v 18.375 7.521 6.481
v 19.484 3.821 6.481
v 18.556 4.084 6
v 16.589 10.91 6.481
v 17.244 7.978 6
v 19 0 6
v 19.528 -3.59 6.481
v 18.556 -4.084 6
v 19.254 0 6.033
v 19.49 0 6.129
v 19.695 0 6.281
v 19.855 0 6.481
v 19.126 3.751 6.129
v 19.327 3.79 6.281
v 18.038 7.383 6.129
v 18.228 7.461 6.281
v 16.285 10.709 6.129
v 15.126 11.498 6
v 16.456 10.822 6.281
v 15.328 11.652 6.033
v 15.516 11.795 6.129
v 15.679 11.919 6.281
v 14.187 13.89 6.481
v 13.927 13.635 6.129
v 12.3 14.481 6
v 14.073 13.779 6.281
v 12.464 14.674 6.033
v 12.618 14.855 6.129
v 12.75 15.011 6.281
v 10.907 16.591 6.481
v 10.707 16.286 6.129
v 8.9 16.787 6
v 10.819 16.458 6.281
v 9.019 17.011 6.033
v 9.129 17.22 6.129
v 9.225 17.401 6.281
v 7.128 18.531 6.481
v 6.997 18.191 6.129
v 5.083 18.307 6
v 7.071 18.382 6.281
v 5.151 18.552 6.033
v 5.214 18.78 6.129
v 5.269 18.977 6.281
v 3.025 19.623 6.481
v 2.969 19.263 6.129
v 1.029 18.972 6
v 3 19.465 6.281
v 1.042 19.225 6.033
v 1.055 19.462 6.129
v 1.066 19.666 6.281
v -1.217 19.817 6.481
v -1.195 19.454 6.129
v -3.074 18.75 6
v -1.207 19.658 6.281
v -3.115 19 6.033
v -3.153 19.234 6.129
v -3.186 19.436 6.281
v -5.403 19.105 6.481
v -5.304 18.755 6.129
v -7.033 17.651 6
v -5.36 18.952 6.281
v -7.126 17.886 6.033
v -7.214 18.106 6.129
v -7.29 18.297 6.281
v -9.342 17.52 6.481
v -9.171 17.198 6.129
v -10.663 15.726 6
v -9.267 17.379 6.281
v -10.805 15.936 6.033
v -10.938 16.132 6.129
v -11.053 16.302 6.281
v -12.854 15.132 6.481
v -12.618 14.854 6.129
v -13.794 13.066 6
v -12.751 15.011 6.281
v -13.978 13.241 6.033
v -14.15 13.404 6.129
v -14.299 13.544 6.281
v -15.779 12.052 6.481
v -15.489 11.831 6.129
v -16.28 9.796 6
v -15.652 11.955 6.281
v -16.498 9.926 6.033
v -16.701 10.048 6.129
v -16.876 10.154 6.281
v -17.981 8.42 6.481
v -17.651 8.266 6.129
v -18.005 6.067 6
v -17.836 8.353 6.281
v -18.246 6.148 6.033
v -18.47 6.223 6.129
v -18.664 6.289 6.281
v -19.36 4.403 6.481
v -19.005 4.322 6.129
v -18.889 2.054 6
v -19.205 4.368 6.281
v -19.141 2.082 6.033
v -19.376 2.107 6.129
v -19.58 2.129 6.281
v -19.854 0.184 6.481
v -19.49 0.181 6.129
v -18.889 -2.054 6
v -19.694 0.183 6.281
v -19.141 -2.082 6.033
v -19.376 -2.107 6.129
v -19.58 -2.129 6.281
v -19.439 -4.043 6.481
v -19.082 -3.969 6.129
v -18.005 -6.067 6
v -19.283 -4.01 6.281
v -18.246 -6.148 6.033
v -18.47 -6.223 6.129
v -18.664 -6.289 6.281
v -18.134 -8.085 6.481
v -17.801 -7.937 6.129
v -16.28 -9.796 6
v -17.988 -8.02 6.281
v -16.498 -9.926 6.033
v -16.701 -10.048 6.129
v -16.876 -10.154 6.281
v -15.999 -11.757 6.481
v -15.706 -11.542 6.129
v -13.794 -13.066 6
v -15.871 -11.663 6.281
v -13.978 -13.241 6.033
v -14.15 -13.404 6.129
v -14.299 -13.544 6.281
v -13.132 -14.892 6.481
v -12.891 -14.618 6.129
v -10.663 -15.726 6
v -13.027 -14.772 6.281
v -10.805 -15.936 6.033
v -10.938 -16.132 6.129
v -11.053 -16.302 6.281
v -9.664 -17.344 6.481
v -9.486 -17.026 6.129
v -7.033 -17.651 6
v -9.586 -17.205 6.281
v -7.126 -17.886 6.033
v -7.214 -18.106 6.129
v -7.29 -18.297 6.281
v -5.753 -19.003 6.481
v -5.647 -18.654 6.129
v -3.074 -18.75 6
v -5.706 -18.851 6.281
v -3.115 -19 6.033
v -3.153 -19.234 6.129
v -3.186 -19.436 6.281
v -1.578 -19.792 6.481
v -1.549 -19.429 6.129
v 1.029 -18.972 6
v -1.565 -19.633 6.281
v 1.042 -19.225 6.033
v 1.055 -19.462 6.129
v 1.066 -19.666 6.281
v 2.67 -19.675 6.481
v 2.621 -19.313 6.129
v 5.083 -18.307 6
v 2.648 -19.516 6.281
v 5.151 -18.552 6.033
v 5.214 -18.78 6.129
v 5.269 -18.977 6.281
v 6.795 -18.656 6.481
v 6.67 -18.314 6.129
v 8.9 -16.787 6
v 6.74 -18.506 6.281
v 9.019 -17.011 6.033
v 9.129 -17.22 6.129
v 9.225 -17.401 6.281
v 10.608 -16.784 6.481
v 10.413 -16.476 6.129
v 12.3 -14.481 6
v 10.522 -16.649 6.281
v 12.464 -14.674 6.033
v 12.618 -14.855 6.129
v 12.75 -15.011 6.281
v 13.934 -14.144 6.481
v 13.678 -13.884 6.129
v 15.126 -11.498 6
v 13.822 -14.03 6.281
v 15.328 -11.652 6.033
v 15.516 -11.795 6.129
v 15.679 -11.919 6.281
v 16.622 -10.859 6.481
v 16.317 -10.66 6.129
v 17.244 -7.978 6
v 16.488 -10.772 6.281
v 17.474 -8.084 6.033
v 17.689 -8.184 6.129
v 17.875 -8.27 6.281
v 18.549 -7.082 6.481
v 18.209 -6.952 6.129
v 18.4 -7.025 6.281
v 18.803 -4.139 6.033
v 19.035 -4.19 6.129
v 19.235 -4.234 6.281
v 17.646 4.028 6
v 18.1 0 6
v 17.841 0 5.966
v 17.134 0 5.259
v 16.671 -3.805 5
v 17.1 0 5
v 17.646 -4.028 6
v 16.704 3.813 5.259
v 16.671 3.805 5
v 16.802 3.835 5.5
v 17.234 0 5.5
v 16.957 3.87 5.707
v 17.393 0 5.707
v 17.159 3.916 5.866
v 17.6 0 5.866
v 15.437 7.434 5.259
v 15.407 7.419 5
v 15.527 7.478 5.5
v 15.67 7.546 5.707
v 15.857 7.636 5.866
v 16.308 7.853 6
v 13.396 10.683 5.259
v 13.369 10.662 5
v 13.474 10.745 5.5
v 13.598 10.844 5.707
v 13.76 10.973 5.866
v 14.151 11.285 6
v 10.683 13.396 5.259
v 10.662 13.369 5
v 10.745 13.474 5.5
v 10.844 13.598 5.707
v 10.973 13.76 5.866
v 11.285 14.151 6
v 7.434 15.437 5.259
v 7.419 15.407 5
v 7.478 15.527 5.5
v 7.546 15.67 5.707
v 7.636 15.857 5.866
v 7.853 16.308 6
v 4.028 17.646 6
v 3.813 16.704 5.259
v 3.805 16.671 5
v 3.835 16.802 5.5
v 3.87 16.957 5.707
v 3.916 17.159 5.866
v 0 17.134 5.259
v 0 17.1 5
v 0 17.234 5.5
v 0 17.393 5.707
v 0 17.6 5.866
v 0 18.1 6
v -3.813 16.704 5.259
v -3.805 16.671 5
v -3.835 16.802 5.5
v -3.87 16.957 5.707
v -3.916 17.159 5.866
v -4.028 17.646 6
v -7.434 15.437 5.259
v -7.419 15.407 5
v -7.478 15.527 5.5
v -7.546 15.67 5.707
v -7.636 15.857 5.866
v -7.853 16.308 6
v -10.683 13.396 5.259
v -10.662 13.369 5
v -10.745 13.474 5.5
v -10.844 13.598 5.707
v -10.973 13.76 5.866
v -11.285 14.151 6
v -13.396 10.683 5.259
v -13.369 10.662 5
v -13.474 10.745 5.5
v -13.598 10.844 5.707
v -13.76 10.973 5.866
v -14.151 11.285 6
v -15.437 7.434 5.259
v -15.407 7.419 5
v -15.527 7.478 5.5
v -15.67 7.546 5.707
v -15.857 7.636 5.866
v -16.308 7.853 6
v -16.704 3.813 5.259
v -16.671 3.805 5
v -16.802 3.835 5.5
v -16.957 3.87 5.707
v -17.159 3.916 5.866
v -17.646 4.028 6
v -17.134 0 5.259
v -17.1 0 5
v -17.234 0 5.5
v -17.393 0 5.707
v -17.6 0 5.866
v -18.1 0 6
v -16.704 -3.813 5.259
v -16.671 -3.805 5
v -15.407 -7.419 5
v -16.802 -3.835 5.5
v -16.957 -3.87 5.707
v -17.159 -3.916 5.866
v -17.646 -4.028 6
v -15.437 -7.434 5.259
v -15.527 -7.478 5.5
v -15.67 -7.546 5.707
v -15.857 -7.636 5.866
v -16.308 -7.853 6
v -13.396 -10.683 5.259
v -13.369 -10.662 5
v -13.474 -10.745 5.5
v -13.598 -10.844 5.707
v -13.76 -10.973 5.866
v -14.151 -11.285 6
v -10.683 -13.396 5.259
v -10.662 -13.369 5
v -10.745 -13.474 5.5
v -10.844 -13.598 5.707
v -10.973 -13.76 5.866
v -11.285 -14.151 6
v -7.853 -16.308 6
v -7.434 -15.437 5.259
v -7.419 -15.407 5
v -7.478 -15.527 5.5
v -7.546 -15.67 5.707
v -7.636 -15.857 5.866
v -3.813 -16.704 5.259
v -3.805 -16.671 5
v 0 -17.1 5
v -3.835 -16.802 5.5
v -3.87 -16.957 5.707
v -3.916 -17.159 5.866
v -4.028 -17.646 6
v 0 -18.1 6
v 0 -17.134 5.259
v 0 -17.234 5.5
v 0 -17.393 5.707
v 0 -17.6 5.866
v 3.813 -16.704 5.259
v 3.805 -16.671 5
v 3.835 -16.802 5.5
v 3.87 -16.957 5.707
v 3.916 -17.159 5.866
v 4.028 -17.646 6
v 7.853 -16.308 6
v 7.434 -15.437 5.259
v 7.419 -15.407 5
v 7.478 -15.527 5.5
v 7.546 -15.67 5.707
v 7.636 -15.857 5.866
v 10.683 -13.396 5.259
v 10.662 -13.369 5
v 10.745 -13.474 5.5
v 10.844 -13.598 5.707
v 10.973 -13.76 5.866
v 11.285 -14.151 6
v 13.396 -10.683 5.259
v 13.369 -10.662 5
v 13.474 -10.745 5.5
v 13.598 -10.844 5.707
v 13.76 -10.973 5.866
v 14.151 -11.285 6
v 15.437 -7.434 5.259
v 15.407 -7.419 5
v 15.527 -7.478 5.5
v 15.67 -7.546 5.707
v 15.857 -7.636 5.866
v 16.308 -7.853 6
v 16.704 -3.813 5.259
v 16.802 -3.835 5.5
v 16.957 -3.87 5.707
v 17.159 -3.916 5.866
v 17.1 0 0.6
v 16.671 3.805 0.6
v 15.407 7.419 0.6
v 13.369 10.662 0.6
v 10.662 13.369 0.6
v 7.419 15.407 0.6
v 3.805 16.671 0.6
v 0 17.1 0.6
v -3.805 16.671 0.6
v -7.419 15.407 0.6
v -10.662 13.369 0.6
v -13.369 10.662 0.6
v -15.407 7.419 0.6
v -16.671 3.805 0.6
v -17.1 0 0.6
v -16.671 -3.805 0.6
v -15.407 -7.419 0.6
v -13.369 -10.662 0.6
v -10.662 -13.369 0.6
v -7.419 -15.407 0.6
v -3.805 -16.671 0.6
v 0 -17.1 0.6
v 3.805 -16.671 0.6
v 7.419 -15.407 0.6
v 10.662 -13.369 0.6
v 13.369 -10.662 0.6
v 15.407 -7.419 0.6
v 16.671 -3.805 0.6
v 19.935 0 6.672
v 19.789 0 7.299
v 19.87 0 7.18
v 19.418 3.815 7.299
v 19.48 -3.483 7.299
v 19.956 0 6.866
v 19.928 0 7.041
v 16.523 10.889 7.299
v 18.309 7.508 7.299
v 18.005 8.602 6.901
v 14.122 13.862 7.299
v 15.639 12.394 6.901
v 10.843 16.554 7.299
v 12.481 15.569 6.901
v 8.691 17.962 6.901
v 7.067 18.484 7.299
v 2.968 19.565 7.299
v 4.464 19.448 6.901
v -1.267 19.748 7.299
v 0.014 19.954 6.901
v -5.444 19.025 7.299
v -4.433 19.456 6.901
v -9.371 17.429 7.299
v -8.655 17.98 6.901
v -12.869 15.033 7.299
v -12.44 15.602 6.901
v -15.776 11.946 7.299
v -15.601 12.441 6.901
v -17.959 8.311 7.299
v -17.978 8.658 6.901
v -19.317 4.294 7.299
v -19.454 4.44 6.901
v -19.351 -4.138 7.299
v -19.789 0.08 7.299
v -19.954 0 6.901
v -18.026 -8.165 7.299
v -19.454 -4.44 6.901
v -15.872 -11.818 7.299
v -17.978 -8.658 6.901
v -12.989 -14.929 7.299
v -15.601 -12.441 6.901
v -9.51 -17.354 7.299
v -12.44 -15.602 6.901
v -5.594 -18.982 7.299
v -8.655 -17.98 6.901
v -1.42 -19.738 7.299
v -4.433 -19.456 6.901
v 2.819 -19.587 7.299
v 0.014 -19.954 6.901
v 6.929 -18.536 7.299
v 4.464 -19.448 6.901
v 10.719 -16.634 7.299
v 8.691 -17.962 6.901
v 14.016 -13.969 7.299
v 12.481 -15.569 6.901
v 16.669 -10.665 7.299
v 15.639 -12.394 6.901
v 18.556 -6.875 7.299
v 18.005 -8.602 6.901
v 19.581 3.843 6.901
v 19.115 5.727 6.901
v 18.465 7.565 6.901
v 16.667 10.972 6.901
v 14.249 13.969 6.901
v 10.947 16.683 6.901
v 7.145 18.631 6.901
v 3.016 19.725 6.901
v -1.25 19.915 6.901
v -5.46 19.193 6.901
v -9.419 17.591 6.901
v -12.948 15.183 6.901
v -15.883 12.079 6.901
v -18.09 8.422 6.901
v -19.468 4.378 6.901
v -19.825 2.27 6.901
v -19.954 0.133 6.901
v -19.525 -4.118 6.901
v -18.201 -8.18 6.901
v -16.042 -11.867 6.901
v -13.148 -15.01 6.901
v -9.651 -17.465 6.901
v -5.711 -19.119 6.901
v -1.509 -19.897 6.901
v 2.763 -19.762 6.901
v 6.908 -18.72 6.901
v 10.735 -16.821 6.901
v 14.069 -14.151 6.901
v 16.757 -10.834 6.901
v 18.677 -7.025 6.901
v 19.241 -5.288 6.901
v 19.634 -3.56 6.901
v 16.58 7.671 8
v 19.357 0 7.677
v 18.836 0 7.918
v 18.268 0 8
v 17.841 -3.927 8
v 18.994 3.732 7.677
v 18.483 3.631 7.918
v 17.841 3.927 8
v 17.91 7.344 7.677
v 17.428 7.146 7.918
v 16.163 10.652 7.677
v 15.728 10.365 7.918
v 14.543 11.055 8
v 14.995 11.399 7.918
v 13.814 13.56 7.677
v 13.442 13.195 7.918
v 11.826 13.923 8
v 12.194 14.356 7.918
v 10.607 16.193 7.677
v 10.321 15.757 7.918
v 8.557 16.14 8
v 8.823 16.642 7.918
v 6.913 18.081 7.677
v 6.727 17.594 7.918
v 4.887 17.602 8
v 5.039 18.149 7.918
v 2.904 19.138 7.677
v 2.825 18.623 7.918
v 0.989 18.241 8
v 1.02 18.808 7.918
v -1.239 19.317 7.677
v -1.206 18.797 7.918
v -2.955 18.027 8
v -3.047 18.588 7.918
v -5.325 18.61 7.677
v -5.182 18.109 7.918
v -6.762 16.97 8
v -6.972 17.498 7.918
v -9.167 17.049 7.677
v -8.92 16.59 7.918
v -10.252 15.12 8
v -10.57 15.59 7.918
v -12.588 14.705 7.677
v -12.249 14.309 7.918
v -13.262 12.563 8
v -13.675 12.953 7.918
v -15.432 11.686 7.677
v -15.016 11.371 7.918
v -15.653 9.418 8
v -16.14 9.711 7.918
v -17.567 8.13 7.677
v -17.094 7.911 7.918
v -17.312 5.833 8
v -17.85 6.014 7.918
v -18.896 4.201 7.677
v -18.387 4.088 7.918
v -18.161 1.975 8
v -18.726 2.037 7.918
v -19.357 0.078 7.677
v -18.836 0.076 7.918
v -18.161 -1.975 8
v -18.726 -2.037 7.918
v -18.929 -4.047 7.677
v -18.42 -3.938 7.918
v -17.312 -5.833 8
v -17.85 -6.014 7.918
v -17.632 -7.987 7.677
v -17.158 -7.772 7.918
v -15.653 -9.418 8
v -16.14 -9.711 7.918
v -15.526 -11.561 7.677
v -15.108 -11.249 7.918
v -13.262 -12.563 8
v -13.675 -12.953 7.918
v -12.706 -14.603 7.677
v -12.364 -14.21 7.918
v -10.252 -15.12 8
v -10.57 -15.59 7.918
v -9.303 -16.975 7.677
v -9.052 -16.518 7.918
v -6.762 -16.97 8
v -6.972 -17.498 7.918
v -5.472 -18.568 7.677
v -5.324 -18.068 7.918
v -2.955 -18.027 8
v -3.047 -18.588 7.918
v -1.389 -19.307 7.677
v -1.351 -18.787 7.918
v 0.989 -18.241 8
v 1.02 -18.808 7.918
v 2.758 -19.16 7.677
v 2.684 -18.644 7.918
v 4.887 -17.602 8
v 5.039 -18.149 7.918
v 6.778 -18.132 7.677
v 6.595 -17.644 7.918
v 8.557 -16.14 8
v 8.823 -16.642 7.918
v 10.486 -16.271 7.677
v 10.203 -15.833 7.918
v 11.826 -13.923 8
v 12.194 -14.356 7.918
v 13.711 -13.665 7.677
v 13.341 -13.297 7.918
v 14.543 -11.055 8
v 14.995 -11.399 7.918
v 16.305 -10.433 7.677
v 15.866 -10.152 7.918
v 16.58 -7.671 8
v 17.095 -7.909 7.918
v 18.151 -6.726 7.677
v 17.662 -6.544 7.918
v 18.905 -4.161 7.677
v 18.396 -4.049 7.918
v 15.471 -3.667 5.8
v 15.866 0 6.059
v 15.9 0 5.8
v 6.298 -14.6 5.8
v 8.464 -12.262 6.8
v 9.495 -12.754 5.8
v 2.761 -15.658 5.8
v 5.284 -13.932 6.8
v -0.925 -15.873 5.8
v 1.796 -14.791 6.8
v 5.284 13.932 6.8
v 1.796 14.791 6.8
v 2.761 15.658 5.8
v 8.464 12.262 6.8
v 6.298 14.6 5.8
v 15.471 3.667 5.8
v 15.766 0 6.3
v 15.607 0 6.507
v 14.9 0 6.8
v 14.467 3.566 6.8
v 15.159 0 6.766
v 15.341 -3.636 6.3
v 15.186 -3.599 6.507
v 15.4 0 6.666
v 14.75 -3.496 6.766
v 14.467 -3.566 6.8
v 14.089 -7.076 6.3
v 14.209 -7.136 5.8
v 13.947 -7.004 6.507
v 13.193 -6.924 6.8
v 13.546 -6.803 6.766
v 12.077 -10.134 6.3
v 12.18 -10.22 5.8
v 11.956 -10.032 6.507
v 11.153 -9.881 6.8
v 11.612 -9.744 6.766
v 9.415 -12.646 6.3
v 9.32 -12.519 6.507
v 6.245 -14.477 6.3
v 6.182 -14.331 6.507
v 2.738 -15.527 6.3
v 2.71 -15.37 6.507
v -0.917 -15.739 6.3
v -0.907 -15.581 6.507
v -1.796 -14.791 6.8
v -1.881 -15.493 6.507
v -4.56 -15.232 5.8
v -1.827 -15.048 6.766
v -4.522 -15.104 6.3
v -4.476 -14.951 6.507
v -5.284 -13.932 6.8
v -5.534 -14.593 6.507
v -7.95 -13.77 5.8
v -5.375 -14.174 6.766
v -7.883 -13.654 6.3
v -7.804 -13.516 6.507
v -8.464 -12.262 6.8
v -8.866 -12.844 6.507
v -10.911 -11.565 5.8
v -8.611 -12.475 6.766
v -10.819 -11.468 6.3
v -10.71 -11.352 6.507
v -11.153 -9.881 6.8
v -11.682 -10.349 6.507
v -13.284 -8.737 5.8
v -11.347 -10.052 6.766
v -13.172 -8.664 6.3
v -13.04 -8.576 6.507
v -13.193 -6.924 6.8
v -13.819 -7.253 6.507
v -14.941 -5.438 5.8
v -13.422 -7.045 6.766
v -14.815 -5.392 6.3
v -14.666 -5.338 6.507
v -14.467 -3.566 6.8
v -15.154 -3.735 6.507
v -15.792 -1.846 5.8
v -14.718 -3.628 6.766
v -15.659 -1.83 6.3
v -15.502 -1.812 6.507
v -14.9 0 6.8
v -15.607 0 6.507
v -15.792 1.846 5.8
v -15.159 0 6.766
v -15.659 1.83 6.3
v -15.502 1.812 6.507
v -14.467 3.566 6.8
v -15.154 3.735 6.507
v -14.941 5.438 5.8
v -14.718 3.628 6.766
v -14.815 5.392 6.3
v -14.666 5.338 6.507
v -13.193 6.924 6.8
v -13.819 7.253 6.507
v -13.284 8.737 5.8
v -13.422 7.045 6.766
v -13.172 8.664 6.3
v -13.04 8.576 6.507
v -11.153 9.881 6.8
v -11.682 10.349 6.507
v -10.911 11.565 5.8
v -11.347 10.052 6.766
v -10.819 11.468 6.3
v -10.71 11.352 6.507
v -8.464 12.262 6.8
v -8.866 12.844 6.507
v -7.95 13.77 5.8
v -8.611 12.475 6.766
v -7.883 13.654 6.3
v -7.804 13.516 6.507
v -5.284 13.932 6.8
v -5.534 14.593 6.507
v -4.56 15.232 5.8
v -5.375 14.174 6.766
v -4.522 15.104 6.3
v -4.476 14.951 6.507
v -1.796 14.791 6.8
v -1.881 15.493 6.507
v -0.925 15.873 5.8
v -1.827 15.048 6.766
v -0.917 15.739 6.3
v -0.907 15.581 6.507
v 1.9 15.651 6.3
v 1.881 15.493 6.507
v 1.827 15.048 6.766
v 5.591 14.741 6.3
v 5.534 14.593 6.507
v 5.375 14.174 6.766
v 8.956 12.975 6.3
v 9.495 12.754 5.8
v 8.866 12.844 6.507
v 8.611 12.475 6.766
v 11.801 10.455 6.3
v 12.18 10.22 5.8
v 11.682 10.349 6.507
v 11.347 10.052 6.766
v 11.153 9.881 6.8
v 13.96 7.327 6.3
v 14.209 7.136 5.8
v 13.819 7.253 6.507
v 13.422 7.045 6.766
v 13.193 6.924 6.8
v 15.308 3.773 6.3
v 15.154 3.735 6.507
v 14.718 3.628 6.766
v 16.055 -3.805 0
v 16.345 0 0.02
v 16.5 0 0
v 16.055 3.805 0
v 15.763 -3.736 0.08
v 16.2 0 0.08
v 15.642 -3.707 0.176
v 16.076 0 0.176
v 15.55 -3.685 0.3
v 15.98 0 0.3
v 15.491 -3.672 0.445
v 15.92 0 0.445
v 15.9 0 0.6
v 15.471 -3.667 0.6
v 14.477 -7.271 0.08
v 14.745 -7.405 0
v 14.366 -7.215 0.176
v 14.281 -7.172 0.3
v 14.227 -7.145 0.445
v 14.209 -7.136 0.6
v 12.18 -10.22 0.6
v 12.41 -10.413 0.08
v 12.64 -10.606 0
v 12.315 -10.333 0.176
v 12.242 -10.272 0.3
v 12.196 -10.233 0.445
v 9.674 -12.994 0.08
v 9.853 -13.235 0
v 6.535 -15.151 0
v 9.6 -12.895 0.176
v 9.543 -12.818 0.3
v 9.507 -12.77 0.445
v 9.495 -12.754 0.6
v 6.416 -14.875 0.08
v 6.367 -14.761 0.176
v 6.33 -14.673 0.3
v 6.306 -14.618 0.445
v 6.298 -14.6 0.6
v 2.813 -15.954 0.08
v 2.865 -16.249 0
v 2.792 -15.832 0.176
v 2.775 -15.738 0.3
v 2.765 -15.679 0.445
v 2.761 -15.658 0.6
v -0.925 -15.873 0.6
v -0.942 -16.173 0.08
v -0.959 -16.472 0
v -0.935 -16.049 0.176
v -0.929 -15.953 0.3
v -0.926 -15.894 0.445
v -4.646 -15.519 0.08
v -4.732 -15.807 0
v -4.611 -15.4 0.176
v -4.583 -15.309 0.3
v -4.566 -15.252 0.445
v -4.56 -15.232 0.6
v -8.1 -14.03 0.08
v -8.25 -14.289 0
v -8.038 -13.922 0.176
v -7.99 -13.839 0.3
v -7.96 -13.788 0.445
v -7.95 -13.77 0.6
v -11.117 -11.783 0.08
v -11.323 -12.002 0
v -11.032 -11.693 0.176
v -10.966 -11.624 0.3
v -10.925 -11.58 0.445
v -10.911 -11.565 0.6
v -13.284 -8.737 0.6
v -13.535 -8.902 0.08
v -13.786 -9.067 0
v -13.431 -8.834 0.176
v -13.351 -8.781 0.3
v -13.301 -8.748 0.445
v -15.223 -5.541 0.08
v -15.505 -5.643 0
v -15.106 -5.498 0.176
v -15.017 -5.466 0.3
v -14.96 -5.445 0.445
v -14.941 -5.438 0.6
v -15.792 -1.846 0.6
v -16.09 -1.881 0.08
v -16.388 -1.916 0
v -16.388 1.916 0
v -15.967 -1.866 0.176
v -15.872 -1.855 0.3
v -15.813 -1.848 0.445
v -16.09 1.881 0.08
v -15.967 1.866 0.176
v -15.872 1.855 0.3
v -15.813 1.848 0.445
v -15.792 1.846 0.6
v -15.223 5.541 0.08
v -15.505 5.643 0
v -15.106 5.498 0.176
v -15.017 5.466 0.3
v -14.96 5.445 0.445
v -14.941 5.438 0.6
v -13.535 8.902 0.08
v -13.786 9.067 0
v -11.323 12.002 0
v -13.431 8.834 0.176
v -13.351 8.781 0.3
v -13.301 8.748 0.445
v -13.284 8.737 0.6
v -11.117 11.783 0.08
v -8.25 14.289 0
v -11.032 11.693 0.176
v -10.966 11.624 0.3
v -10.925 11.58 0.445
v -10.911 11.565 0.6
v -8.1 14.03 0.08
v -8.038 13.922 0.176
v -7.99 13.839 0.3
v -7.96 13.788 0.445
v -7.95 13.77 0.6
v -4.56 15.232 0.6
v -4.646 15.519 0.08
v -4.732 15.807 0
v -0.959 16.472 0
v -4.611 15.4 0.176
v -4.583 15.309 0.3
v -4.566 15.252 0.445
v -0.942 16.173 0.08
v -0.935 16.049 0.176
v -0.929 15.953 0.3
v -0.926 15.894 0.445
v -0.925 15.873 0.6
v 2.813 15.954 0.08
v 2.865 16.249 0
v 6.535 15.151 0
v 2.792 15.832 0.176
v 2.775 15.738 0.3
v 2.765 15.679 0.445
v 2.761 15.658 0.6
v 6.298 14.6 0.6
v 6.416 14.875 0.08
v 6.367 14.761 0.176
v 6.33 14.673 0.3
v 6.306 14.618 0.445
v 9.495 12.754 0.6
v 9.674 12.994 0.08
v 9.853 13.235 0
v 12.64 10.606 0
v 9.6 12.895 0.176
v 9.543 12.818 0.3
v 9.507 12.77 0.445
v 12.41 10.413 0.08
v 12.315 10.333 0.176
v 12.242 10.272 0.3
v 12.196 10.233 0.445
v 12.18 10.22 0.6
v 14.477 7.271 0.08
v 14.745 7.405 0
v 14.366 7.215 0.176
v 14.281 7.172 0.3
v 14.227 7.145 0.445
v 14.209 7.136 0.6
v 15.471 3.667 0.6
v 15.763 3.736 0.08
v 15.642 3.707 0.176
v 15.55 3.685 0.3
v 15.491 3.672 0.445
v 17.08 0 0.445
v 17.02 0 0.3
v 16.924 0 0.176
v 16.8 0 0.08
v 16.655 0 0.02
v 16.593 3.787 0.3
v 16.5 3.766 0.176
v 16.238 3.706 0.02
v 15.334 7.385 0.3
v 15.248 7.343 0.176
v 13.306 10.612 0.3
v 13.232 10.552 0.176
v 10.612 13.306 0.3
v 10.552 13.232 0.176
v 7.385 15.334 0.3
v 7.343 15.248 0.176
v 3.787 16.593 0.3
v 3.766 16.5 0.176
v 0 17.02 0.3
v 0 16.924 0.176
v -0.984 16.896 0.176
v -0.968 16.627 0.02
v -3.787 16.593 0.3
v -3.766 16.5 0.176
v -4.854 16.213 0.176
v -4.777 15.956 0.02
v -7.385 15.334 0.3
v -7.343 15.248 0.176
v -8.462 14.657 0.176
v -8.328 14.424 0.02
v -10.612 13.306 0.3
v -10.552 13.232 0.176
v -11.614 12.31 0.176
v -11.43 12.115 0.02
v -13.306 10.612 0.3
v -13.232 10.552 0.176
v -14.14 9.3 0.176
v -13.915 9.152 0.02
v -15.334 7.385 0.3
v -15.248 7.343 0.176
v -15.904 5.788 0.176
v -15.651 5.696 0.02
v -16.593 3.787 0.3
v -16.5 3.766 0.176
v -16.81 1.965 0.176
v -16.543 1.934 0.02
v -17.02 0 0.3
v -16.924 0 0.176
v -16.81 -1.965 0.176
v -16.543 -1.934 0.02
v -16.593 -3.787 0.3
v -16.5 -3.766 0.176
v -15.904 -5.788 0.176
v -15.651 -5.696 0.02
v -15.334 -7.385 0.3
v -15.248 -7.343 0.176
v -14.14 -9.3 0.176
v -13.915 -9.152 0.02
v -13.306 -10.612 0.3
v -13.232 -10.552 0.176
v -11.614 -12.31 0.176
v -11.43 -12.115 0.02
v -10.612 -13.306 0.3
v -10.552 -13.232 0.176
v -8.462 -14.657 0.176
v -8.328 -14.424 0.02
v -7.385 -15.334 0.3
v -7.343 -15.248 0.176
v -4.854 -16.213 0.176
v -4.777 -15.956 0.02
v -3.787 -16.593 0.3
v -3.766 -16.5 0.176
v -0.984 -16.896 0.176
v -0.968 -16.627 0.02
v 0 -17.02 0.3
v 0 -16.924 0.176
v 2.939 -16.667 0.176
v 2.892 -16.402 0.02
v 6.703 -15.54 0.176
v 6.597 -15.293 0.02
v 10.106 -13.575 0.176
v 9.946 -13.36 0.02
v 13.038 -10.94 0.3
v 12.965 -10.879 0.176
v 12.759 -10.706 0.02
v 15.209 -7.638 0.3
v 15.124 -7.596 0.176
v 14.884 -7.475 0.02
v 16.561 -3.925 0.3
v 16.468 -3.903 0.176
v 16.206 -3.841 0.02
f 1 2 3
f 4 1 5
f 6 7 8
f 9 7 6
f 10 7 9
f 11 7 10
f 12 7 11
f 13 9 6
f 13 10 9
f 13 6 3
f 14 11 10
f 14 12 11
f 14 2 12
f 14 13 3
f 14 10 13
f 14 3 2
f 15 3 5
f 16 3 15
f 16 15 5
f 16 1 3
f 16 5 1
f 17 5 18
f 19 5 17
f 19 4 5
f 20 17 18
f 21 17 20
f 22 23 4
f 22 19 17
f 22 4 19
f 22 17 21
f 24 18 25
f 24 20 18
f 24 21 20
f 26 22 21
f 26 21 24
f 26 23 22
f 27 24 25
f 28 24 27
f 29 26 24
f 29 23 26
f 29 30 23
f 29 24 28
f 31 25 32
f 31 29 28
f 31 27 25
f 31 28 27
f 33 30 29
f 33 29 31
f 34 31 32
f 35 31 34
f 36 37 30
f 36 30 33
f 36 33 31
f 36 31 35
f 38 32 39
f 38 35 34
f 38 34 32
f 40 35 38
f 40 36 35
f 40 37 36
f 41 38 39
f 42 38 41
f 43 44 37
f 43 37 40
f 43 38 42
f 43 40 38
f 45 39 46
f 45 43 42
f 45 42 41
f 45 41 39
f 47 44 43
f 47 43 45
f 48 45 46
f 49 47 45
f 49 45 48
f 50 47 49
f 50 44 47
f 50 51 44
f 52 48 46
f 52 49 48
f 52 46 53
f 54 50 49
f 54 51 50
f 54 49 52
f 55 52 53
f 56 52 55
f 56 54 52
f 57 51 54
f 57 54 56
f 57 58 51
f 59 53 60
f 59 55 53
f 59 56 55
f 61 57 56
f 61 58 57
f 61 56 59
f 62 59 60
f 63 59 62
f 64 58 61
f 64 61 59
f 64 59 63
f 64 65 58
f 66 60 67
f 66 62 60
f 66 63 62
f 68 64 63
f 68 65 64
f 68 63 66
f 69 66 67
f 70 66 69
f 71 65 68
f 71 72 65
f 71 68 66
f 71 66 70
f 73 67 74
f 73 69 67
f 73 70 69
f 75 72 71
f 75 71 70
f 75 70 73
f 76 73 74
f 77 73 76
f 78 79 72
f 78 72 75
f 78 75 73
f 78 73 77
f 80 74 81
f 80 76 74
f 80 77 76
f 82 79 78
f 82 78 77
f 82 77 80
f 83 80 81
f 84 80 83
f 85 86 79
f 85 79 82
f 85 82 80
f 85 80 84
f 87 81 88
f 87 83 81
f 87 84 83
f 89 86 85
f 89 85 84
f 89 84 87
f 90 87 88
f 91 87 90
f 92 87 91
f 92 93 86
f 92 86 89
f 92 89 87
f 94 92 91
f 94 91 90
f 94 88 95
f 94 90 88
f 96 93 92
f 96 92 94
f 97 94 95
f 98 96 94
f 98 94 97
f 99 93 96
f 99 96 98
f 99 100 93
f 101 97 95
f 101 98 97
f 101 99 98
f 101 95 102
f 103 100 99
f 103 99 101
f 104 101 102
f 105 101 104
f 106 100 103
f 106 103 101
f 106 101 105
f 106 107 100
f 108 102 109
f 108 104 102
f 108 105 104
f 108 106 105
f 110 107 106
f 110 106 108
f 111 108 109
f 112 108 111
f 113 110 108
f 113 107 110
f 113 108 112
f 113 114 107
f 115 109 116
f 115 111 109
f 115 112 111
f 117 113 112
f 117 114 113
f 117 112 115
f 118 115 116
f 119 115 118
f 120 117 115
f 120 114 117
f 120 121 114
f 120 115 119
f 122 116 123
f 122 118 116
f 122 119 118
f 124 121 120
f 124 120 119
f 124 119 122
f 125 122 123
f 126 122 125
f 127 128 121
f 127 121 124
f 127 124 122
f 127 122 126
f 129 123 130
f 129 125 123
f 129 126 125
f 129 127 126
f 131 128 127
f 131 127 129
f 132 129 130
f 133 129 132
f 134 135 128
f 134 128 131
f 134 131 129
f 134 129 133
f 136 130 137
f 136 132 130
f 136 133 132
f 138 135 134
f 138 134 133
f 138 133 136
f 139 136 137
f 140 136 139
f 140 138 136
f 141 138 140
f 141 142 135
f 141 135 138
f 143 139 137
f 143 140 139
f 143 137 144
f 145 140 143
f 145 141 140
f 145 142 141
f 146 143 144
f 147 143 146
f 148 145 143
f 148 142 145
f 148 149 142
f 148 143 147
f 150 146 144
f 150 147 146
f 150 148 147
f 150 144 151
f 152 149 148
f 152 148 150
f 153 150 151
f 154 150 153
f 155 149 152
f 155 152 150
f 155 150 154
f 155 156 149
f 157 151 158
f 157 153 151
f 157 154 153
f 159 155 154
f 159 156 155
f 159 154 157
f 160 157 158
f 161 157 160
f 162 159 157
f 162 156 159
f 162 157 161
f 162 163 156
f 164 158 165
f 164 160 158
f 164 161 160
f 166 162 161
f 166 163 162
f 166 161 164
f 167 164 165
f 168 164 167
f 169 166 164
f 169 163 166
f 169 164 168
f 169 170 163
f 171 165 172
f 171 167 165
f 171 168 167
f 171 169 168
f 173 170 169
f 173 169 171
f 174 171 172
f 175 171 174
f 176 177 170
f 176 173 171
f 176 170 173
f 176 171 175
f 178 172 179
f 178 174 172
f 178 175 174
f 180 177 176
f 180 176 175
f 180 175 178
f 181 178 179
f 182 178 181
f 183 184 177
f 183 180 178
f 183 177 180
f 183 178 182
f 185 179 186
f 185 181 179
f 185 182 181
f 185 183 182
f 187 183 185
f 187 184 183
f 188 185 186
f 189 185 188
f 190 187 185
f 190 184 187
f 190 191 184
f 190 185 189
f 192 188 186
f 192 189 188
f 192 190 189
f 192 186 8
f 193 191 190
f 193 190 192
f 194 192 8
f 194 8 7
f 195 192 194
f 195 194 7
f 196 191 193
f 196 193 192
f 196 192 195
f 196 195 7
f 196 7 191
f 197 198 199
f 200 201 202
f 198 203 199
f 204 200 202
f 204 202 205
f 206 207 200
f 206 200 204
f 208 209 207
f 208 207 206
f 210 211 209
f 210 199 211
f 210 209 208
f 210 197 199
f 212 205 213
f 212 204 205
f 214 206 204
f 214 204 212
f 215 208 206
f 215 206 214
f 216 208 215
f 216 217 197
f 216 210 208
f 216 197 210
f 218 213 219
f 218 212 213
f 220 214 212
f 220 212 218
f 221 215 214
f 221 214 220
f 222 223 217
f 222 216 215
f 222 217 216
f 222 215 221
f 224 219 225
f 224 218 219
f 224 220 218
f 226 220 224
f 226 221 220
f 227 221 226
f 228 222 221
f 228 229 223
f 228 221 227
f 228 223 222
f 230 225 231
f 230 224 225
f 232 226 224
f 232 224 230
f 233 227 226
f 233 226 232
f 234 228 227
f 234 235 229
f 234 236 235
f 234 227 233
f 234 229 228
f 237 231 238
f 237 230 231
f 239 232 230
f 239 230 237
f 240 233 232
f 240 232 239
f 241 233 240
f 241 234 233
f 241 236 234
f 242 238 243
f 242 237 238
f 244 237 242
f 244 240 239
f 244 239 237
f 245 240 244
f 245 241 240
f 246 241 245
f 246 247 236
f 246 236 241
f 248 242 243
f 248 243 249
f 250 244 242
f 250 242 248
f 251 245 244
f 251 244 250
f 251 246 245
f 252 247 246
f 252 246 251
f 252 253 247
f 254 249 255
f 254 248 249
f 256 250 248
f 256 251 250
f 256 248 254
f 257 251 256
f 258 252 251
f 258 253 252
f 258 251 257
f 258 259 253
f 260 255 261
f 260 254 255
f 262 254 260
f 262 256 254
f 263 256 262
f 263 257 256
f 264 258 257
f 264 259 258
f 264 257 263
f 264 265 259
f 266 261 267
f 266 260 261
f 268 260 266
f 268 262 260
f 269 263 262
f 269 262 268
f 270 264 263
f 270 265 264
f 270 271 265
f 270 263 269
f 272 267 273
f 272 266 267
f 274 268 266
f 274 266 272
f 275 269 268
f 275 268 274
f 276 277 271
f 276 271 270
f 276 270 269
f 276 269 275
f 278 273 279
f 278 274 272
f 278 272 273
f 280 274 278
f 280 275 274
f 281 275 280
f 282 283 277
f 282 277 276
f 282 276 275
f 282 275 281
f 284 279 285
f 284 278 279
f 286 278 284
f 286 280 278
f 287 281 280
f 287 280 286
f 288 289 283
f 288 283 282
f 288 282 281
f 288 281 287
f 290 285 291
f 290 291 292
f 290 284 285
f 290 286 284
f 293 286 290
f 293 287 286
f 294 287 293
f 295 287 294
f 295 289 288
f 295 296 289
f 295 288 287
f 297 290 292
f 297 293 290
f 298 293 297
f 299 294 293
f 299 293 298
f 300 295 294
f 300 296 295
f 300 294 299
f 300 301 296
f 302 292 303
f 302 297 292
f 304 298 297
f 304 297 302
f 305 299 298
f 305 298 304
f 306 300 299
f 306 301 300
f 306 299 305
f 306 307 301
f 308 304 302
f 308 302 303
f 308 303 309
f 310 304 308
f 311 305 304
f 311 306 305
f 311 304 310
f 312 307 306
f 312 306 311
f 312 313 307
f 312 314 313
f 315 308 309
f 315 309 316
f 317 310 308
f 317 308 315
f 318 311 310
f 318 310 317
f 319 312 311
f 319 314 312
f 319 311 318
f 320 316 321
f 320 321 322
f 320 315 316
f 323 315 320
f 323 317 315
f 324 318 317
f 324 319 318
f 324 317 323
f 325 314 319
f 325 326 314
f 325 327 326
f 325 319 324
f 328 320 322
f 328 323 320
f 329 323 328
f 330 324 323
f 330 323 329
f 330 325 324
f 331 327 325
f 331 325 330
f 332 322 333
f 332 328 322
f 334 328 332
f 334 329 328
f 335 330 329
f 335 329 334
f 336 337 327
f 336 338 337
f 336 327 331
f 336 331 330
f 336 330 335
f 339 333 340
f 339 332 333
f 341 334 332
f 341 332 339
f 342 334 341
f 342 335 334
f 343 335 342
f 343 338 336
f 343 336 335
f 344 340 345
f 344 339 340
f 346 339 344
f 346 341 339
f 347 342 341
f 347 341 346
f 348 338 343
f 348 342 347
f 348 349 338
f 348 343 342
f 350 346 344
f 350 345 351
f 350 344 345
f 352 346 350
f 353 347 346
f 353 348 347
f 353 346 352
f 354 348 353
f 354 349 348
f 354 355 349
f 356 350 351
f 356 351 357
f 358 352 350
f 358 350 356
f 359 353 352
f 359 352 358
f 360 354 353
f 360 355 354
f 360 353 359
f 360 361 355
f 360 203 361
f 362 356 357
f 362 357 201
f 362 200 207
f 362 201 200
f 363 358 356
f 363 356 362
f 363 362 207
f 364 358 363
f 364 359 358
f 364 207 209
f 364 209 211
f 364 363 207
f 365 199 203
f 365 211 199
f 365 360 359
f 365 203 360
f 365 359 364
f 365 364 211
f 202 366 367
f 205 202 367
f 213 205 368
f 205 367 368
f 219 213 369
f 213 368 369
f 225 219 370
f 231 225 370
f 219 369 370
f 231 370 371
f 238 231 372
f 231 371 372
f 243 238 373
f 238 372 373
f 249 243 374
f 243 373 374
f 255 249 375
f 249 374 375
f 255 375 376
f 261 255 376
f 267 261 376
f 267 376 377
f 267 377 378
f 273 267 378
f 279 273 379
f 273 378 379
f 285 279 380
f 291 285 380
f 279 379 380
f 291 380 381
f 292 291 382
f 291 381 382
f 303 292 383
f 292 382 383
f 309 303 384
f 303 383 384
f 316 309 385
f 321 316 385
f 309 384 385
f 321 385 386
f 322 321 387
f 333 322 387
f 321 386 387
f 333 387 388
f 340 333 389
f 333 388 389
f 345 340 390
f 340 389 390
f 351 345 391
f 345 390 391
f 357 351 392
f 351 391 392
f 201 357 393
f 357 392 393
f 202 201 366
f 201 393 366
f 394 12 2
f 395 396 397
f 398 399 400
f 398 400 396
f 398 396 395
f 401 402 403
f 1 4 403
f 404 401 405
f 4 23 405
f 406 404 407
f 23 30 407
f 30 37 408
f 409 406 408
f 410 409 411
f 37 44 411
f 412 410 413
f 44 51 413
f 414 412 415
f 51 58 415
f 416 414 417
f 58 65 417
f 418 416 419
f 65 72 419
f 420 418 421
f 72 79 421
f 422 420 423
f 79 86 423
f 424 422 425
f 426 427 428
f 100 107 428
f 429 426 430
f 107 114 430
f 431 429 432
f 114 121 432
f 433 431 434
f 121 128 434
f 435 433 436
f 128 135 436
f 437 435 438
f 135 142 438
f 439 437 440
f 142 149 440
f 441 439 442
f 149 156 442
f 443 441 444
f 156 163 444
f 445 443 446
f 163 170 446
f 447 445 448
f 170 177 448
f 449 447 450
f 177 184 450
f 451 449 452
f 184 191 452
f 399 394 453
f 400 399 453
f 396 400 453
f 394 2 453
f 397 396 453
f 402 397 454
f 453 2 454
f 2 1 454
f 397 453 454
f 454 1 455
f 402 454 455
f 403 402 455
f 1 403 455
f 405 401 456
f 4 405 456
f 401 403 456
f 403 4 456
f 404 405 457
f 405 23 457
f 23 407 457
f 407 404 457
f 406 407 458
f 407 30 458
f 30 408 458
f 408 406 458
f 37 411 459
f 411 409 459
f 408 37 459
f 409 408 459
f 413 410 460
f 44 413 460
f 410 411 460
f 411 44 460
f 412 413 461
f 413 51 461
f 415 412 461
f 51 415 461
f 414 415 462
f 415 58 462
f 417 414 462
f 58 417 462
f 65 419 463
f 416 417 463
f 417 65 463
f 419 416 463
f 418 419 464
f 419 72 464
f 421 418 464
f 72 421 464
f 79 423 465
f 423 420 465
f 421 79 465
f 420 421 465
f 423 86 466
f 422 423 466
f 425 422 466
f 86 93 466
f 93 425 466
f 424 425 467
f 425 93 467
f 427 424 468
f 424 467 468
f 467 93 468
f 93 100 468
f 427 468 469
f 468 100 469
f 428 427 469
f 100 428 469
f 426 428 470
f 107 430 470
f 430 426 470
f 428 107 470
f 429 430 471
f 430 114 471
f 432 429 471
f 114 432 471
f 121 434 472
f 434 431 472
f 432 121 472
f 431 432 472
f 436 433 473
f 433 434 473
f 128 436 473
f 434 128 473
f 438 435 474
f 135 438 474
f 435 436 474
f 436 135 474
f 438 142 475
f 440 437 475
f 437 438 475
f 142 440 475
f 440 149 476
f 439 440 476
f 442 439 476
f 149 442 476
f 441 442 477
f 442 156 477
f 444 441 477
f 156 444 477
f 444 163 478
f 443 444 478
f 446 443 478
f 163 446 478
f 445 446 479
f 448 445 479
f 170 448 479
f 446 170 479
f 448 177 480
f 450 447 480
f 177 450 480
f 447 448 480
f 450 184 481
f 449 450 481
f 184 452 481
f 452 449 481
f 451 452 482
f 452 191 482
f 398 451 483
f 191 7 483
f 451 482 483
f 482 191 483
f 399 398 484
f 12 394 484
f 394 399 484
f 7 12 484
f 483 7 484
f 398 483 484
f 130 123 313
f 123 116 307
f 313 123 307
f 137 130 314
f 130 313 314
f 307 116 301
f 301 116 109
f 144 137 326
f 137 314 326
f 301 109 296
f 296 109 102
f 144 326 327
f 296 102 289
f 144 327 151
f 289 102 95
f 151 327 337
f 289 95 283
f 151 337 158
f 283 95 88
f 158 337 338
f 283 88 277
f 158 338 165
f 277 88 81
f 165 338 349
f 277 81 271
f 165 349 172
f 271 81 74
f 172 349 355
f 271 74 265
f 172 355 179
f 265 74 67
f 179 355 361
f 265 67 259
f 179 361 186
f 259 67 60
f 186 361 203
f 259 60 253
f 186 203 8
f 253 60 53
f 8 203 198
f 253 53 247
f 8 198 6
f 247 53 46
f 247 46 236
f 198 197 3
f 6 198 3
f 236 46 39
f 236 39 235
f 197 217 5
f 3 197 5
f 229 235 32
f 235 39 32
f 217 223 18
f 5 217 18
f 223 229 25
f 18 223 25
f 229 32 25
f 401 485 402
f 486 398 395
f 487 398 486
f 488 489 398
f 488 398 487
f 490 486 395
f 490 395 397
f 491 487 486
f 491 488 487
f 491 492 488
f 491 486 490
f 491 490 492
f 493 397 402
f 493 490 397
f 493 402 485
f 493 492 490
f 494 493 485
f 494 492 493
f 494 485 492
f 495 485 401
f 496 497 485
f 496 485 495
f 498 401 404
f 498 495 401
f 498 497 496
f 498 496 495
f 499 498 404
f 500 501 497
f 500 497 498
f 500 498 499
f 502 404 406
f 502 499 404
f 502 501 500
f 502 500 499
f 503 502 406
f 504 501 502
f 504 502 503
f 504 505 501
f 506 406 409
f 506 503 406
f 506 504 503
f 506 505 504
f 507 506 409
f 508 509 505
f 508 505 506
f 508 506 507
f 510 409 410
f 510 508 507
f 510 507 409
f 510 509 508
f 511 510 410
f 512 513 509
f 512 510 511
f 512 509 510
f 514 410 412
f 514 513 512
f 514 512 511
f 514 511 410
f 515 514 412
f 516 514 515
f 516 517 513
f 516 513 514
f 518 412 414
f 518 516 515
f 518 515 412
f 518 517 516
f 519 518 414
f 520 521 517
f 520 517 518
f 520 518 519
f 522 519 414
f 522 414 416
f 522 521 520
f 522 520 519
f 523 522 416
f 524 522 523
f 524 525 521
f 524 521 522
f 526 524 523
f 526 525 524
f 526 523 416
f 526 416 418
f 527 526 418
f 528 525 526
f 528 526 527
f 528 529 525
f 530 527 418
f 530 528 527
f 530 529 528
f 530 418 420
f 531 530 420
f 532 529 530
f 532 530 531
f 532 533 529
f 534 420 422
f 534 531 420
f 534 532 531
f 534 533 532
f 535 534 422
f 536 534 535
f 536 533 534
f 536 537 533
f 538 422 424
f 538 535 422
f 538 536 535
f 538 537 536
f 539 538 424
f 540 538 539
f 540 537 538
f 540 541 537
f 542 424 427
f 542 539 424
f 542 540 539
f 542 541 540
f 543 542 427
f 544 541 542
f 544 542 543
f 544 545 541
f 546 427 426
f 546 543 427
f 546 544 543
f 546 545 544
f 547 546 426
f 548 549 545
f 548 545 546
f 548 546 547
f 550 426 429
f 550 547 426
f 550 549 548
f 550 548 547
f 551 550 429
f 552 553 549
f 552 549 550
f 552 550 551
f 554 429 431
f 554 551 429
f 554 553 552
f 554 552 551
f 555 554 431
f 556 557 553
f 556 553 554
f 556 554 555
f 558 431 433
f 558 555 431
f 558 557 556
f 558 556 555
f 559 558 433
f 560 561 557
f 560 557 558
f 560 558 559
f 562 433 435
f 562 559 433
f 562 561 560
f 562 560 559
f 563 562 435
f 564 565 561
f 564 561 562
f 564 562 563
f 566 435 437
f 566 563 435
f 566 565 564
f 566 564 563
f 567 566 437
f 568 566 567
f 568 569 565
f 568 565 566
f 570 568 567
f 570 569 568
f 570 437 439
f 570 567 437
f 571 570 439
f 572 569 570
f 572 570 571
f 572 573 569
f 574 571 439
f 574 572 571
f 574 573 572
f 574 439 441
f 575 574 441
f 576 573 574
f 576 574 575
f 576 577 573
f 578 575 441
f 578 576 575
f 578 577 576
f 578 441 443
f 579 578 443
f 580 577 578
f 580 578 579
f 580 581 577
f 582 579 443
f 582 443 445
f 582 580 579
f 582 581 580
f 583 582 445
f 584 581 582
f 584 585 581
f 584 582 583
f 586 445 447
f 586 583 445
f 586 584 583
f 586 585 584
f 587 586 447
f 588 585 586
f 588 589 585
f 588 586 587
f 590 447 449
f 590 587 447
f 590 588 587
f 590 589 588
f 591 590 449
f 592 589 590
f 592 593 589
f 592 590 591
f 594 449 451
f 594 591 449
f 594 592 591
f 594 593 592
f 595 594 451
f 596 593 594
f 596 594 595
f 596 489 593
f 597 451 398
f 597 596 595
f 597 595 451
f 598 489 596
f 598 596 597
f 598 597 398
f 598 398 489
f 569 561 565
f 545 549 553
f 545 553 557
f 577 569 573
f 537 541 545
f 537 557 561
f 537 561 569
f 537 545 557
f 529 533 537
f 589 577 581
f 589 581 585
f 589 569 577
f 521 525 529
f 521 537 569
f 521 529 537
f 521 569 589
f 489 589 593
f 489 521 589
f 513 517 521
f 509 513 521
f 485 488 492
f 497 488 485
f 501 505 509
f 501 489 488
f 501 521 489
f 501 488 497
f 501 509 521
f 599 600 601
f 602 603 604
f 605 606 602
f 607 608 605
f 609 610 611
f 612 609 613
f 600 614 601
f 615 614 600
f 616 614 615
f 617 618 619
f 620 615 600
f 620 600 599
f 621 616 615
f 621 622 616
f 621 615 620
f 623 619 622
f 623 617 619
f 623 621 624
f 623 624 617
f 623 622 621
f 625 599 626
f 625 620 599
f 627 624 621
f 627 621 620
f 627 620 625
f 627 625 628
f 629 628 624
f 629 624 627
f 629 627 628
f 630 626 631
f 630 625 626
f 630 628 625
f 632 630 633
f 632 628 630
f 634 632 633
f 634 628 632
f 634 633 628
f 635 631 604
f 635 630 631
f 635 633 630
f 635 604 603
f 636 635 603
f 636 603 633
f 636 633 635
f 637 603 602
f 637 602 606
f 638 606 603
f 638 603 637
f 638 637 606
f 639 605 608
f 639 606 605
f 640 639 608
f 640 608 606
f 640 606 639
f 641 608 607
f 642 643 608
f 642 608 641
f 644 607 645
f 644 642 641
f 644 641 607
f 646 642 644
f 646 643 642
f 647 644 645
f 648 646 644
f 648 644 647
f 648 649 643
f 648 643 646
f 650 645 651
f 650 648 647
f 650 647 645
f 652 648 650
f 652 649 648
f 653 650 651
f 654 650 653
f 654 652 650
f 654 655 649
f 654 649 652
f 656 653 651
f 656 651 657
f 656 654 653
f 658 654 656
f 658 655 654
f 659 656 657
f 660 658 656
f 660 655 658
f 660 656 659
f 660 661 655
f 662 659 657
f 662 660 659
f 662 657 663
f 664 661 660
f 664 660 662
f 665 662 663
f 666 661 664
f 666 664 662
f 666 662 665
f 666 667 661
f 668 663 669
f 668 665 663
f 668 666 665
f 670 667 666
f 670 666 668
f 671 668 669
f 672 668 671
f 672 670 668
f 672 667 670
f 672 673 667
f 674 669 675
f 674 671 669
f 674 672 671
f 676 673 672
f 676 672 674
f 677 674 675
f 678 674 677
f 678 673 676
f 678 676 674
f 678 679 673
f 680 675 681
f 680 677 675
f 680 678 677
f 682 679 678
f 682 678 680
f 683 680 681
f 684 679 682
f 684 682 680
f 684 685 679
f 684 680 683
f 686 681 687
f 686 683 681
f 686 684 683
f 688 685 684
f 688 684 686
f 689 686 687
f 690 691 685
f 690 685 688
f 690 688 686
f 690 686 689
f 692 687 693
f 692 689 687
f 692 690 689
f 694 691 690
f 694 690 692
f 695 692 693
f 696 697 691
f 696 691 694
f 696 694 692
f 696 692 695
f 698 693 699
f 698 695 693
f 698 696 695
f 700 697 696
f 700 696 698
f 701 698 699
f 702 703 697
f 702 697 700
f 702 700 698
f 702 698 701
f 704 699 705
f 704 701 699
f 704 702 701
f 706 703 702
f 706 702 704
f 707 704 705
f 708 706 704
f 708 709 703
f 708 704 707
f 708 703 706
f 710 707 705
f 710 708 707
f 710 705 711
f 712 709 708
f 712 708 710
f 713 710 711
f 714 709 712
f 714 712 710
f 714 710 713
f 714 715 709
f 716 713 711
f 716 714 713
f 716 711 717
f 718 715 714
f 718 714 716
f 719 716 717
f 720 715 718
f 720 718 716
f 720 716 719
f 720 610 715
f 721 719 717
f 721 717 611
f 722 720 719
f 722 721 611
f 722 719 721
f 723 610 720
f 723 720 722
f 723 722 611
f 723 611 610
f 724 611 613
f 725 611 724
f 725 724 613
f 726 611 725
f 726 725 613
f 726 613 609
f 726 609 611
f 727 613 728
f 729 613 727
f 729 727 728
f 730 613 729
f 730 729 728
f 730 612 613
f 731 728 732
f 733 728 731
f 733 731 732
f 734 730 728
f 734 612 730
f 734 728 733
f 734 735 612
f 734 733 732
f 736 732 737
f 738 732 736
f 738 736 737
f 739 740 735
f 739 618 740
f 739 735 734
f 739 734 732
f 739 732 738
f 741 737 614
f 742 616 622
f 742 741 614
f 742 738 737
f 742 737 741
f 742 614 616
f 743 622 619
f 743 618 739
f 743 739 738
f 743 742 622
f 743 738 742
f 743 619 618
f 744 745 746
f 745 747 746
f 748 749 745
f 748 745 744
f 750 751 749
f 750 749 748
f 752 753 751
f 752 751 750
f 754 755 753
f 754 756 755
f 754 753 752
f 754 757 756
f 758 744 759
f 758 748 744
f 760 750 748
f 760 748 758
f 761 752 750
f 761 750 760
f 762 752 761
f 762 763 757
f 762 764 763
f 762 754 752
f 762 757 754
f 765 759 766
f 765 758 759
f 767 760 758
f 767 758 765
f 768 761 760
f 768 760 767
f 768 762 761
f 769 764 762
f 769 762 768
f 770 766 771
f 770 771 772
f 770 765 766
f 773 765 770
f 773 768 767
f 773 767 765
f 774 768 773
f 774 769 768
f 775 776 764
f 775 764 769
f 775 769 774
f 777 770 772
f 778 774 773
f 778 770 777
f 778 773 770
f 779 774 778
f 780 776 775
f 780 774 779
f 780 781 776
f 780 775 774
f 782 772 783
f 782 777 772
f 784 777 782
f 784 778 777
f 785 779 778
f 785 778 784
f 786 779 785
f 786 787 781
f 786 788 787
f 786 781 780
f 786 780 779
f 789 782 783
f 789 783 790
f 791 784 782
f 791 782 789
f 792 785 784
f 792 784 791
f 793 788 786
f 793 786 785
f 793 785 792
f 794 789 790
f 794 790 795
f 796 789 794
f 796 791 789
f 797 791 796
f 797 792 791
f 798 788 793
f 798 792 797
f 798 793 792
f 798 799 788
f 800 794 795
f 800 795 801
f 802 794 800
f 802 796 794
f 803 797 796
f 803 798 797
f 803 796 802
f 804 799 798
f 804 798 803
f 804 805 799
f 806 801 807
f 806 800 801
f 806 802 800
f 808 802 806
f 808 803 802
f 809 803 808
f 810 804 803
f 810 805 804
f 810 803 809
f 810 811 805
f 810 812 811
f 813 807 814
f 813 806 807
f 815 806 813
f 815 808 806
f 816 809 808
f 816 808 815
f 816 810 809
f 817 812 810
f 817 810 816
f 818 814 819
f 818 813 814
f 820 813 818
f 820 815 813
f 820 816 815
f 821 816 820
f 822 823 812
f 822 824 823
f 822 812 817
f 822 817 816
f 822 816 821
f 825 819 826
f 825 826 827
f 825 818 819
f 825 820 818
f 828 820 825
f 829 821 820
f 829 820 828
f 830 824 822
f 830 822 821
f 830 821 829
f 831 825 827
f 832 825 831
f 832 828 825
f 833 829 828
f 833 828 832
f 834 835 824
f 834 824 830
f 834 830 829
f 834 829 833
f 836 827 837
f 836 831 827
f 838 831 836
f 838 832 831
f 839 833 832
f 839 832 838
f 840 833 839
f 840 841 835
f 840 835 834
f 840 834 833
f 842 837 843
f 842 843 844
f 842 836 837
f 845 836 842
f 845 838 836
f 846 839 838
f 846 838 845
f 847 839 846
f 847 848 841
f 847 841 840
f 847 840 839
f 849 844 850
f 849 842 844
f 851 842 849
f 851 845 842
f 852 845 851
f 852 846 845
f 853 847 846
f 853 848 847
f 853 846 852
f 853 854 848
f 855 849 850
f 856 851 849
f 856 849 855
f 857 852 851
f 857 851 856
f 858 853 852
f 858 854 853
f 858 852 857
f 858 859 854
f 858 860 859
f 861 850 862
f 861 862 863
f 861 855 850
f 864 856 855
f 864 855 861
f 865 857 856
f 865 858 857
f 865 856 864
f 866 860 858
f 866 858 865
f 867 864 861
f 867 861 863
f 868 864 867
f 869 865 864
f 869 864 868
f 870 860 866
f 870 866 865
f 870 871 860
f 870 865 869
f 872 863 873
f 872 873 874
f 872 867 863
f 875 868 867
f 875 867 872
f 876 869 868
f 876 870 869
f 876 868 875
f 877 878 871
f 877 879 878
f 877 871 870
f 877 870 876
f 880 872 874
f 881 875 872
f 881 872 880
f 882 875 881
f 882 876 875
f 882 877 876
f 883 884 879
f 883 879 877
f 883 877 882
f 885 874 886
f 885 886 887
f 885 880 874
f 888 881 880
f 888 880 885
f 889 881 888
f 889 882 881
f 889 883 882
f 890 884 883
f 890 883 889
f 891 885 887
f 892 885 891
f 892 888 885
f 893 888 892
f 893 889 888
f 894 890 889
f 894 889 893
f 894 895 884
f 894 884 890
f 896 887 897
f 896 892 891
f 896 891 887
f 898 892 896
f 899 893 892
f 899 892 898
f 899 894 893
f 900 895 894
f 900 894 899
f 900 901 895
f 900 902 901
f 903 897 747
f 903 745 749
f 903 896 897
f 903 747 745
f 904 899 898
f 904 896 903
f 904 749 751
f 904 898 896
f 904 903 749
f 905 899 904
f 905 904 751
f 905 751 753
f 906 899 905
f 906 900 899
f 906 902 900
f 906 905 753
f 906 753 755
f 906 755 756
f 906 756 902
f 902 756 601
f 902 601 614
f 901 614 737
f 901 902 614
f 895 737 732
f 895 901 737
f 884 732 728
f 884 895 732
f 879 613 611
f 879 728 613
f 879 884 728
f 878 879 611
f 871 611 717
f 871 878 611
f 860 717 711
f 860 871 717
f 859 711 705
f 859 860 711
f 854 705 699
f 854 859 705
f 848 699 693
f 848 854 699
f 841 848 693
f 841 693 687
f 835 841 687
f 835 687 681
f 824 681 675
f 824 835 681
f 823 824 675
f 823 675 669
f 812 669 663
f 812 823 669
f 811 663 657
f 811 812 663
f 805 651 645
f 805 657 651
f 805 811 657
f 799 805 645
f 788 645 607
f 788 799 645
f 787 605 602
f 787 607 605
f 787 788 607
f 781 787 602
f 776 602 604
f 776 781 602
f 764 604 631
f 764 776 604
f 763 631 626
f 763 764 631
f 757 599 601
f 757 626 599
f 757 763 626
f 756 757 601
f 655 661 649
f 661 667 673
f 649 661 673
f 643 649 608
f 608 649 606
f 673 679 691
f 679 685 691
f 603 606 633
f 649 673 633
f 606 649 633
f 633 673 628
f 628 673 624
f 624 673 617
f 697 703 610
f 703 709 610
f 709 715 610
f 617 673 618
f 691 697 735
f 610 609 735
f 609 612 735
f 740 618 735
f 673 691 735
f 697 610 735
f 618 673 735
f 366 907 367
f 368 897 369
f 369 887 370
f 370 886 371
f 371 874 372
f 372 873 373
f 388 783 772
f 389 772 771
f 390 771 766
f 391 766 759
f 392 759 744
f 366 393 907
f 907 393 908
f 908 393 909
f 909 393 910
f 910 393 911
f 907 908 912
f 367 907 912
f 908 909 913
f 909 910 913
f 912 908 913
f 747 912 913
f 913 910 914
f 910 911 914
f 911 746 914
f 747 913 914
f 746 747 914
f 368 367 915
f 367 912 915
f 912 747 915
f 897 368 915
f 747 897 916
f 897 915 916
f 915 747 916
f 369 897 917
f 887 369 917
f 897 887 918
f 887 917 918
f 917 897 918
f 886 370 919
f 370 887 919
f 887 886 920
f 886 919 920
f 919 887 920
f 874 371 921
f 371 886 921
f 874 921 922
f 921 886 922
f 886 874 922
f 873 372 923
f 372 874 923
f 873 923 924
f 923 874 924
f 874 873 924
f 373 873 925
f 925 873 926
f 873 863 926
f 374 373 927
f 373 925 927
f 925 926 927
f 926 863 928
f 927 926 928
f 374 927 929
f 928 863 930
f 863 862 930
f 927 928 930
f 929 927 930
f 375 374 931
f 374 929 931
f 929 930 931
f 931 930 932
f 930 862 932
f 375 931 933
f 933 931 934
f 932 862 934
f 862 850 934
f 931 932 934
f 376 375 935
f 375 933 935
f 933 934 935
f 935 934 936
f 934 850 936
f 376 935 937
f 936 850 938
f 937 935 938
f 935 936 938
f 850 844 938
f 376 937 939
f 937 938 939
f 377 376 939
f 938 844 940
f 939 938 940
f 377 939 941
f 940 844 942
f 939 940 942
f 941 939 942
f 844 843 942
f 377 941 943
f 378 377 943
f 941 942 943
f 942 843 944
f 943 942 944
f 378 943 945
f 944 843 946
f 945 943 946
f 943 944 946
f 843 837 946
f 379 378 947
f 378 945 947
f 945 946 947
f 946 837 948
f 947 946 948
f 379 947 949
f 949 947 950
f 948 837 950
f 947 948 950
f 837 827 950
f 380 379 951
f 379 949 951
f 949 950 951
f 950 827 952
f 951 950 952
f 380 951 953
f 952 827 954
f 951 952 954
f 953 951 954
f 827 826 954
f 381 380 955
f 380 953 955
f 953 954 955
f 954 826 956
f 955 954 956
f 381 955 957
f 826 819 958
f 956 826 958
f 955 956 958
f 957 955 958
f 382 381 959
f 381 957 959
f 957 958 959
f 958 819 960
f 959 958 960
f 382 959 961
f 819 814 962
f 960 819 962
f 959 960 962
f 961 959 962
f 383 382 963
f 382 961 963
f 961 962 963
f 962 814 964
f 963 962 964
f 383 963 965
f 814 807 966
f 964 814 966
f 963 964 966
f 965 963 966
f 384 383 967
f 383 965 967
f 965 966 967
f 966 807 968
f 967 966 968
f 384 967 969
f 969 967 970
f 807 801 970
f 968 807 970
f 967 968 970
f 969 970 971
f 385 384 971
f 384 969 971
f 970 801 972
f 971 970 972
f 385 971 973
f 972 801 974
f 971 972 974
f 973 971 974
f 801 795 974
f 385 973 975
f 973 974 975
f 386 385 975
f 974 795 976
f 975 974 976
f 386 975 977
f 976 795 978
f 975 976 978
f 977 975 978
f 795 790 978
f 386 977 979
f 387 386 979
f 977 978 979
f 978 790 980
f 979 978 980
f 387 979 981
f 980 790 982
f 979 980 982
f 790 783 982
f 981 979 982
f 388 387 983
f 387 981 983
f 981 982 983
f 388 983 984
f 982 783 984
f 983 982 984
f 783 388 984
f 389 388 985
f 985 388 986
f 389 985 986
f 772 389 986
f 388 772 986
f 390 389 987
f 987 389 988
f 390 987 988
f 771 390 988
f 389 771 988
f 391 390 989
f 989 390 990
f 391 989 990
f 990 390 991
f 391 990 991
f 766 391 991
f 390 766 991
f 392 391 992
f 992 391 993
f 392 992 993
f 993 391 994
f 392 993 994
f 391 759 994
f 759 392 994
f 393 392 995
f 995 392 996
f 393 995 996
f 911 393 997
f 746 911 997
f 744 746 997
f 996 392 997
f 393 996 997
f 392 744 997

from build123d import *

# Parameters (mm, degrees)
F0_R     = 17.1
F1_DEPTH = 6
F2_R     = 20
F2_R_2   = 17.1
F3_DEPTH = 2
F4_T     = -1.2
F5_R     = 0.59999
F6_R     = 1
F8_R     = 0.7


# Not quite as in the source:
# - a fillet or chamfer that OpenCascade refuses, or shapes differently, is made with other operations: its cross-section is extruded or revolved along the edge and cut away or added
# - a fillet or chamfer is up to 0.001 mm smaller than in the source, because OpenCascade refuses the exact size


with BuildPart() as f1:
    # F0 (on Top) → F1 (new body)
    with BuildSketch(Plane.XY):
        Circle(F0_R)
    extrude(amount=F1_DEPTH)

    # F2 (on face) → F3 (join)
    with BuildSketch(Plane.XY.offset(6)):
        Circle(F2_R)
        Circle(F2_R_2, mode=Mode.SUBTRACT)
        Circle(F2_R_2)
    extrude(amount=F3_DEPTH)

    # F4
    f4_openings = [f1.faces().sort_by_distance(p)[0] for p in [
        (0, 0, 0),
    ]]
    offset(amount=F4_T, openings=f4_openings, kind=Kind.INTERSECTION)

    # F5 (radius 0.6 in the source; OpenCascade refuses exactly that, so slightly less here)
    f5_edges = [f1.edges().sort_by_distance(p)[0] for p in [
        (-15.9, 0, 0),
        (-17.1, 0, 0),
    ]]
    fillet(f5_edges, radius=F5_R)

    # F6
    f6_edges = [f1.edges().sort_by_distance(p)[0] for p in [
        (-17.1, 0, 6),
        (-20, 0, 6),
        (-15.9, 0, 6.8),
    ]]
    fillet(f6_edges, radius=F6_R)

    # F7: fillet of radius 2 on 1 edges, made by hand

    # F7_s1 → F7_t2 (revolve, cut)
    with BuildSketch(Plane.XZ):
        with BuildLine():
            ThreePointArc((20, 7), (19.2679491924, 7.7320508076), (18.2679491924, 8))
            Line((18.2679491924, 8), (18.2679491924, 8.04))
            Line((18.2679491924, 8.04), (20, 8.04))
            Line((20, 8.04), (20.04, 8))
            ThreePointArc((20.04, 8), (20.04, 7.5), (20.0346410162, 7.02))
            Line((20.0346410162, 7.02), (20, 7))
        make_face()
    revolve(axis=Axis((0, 0, 8), (0, 0, 1)), mode=Mode.SUBTRACT)

    # F8
    f8_edges = [f1.edges().sort_by_distance(p)[0] for p in [
        (-20, 0, 7),
    ]]
    fillet(f8_edges, radius=F8_R)


solid = f1.part
